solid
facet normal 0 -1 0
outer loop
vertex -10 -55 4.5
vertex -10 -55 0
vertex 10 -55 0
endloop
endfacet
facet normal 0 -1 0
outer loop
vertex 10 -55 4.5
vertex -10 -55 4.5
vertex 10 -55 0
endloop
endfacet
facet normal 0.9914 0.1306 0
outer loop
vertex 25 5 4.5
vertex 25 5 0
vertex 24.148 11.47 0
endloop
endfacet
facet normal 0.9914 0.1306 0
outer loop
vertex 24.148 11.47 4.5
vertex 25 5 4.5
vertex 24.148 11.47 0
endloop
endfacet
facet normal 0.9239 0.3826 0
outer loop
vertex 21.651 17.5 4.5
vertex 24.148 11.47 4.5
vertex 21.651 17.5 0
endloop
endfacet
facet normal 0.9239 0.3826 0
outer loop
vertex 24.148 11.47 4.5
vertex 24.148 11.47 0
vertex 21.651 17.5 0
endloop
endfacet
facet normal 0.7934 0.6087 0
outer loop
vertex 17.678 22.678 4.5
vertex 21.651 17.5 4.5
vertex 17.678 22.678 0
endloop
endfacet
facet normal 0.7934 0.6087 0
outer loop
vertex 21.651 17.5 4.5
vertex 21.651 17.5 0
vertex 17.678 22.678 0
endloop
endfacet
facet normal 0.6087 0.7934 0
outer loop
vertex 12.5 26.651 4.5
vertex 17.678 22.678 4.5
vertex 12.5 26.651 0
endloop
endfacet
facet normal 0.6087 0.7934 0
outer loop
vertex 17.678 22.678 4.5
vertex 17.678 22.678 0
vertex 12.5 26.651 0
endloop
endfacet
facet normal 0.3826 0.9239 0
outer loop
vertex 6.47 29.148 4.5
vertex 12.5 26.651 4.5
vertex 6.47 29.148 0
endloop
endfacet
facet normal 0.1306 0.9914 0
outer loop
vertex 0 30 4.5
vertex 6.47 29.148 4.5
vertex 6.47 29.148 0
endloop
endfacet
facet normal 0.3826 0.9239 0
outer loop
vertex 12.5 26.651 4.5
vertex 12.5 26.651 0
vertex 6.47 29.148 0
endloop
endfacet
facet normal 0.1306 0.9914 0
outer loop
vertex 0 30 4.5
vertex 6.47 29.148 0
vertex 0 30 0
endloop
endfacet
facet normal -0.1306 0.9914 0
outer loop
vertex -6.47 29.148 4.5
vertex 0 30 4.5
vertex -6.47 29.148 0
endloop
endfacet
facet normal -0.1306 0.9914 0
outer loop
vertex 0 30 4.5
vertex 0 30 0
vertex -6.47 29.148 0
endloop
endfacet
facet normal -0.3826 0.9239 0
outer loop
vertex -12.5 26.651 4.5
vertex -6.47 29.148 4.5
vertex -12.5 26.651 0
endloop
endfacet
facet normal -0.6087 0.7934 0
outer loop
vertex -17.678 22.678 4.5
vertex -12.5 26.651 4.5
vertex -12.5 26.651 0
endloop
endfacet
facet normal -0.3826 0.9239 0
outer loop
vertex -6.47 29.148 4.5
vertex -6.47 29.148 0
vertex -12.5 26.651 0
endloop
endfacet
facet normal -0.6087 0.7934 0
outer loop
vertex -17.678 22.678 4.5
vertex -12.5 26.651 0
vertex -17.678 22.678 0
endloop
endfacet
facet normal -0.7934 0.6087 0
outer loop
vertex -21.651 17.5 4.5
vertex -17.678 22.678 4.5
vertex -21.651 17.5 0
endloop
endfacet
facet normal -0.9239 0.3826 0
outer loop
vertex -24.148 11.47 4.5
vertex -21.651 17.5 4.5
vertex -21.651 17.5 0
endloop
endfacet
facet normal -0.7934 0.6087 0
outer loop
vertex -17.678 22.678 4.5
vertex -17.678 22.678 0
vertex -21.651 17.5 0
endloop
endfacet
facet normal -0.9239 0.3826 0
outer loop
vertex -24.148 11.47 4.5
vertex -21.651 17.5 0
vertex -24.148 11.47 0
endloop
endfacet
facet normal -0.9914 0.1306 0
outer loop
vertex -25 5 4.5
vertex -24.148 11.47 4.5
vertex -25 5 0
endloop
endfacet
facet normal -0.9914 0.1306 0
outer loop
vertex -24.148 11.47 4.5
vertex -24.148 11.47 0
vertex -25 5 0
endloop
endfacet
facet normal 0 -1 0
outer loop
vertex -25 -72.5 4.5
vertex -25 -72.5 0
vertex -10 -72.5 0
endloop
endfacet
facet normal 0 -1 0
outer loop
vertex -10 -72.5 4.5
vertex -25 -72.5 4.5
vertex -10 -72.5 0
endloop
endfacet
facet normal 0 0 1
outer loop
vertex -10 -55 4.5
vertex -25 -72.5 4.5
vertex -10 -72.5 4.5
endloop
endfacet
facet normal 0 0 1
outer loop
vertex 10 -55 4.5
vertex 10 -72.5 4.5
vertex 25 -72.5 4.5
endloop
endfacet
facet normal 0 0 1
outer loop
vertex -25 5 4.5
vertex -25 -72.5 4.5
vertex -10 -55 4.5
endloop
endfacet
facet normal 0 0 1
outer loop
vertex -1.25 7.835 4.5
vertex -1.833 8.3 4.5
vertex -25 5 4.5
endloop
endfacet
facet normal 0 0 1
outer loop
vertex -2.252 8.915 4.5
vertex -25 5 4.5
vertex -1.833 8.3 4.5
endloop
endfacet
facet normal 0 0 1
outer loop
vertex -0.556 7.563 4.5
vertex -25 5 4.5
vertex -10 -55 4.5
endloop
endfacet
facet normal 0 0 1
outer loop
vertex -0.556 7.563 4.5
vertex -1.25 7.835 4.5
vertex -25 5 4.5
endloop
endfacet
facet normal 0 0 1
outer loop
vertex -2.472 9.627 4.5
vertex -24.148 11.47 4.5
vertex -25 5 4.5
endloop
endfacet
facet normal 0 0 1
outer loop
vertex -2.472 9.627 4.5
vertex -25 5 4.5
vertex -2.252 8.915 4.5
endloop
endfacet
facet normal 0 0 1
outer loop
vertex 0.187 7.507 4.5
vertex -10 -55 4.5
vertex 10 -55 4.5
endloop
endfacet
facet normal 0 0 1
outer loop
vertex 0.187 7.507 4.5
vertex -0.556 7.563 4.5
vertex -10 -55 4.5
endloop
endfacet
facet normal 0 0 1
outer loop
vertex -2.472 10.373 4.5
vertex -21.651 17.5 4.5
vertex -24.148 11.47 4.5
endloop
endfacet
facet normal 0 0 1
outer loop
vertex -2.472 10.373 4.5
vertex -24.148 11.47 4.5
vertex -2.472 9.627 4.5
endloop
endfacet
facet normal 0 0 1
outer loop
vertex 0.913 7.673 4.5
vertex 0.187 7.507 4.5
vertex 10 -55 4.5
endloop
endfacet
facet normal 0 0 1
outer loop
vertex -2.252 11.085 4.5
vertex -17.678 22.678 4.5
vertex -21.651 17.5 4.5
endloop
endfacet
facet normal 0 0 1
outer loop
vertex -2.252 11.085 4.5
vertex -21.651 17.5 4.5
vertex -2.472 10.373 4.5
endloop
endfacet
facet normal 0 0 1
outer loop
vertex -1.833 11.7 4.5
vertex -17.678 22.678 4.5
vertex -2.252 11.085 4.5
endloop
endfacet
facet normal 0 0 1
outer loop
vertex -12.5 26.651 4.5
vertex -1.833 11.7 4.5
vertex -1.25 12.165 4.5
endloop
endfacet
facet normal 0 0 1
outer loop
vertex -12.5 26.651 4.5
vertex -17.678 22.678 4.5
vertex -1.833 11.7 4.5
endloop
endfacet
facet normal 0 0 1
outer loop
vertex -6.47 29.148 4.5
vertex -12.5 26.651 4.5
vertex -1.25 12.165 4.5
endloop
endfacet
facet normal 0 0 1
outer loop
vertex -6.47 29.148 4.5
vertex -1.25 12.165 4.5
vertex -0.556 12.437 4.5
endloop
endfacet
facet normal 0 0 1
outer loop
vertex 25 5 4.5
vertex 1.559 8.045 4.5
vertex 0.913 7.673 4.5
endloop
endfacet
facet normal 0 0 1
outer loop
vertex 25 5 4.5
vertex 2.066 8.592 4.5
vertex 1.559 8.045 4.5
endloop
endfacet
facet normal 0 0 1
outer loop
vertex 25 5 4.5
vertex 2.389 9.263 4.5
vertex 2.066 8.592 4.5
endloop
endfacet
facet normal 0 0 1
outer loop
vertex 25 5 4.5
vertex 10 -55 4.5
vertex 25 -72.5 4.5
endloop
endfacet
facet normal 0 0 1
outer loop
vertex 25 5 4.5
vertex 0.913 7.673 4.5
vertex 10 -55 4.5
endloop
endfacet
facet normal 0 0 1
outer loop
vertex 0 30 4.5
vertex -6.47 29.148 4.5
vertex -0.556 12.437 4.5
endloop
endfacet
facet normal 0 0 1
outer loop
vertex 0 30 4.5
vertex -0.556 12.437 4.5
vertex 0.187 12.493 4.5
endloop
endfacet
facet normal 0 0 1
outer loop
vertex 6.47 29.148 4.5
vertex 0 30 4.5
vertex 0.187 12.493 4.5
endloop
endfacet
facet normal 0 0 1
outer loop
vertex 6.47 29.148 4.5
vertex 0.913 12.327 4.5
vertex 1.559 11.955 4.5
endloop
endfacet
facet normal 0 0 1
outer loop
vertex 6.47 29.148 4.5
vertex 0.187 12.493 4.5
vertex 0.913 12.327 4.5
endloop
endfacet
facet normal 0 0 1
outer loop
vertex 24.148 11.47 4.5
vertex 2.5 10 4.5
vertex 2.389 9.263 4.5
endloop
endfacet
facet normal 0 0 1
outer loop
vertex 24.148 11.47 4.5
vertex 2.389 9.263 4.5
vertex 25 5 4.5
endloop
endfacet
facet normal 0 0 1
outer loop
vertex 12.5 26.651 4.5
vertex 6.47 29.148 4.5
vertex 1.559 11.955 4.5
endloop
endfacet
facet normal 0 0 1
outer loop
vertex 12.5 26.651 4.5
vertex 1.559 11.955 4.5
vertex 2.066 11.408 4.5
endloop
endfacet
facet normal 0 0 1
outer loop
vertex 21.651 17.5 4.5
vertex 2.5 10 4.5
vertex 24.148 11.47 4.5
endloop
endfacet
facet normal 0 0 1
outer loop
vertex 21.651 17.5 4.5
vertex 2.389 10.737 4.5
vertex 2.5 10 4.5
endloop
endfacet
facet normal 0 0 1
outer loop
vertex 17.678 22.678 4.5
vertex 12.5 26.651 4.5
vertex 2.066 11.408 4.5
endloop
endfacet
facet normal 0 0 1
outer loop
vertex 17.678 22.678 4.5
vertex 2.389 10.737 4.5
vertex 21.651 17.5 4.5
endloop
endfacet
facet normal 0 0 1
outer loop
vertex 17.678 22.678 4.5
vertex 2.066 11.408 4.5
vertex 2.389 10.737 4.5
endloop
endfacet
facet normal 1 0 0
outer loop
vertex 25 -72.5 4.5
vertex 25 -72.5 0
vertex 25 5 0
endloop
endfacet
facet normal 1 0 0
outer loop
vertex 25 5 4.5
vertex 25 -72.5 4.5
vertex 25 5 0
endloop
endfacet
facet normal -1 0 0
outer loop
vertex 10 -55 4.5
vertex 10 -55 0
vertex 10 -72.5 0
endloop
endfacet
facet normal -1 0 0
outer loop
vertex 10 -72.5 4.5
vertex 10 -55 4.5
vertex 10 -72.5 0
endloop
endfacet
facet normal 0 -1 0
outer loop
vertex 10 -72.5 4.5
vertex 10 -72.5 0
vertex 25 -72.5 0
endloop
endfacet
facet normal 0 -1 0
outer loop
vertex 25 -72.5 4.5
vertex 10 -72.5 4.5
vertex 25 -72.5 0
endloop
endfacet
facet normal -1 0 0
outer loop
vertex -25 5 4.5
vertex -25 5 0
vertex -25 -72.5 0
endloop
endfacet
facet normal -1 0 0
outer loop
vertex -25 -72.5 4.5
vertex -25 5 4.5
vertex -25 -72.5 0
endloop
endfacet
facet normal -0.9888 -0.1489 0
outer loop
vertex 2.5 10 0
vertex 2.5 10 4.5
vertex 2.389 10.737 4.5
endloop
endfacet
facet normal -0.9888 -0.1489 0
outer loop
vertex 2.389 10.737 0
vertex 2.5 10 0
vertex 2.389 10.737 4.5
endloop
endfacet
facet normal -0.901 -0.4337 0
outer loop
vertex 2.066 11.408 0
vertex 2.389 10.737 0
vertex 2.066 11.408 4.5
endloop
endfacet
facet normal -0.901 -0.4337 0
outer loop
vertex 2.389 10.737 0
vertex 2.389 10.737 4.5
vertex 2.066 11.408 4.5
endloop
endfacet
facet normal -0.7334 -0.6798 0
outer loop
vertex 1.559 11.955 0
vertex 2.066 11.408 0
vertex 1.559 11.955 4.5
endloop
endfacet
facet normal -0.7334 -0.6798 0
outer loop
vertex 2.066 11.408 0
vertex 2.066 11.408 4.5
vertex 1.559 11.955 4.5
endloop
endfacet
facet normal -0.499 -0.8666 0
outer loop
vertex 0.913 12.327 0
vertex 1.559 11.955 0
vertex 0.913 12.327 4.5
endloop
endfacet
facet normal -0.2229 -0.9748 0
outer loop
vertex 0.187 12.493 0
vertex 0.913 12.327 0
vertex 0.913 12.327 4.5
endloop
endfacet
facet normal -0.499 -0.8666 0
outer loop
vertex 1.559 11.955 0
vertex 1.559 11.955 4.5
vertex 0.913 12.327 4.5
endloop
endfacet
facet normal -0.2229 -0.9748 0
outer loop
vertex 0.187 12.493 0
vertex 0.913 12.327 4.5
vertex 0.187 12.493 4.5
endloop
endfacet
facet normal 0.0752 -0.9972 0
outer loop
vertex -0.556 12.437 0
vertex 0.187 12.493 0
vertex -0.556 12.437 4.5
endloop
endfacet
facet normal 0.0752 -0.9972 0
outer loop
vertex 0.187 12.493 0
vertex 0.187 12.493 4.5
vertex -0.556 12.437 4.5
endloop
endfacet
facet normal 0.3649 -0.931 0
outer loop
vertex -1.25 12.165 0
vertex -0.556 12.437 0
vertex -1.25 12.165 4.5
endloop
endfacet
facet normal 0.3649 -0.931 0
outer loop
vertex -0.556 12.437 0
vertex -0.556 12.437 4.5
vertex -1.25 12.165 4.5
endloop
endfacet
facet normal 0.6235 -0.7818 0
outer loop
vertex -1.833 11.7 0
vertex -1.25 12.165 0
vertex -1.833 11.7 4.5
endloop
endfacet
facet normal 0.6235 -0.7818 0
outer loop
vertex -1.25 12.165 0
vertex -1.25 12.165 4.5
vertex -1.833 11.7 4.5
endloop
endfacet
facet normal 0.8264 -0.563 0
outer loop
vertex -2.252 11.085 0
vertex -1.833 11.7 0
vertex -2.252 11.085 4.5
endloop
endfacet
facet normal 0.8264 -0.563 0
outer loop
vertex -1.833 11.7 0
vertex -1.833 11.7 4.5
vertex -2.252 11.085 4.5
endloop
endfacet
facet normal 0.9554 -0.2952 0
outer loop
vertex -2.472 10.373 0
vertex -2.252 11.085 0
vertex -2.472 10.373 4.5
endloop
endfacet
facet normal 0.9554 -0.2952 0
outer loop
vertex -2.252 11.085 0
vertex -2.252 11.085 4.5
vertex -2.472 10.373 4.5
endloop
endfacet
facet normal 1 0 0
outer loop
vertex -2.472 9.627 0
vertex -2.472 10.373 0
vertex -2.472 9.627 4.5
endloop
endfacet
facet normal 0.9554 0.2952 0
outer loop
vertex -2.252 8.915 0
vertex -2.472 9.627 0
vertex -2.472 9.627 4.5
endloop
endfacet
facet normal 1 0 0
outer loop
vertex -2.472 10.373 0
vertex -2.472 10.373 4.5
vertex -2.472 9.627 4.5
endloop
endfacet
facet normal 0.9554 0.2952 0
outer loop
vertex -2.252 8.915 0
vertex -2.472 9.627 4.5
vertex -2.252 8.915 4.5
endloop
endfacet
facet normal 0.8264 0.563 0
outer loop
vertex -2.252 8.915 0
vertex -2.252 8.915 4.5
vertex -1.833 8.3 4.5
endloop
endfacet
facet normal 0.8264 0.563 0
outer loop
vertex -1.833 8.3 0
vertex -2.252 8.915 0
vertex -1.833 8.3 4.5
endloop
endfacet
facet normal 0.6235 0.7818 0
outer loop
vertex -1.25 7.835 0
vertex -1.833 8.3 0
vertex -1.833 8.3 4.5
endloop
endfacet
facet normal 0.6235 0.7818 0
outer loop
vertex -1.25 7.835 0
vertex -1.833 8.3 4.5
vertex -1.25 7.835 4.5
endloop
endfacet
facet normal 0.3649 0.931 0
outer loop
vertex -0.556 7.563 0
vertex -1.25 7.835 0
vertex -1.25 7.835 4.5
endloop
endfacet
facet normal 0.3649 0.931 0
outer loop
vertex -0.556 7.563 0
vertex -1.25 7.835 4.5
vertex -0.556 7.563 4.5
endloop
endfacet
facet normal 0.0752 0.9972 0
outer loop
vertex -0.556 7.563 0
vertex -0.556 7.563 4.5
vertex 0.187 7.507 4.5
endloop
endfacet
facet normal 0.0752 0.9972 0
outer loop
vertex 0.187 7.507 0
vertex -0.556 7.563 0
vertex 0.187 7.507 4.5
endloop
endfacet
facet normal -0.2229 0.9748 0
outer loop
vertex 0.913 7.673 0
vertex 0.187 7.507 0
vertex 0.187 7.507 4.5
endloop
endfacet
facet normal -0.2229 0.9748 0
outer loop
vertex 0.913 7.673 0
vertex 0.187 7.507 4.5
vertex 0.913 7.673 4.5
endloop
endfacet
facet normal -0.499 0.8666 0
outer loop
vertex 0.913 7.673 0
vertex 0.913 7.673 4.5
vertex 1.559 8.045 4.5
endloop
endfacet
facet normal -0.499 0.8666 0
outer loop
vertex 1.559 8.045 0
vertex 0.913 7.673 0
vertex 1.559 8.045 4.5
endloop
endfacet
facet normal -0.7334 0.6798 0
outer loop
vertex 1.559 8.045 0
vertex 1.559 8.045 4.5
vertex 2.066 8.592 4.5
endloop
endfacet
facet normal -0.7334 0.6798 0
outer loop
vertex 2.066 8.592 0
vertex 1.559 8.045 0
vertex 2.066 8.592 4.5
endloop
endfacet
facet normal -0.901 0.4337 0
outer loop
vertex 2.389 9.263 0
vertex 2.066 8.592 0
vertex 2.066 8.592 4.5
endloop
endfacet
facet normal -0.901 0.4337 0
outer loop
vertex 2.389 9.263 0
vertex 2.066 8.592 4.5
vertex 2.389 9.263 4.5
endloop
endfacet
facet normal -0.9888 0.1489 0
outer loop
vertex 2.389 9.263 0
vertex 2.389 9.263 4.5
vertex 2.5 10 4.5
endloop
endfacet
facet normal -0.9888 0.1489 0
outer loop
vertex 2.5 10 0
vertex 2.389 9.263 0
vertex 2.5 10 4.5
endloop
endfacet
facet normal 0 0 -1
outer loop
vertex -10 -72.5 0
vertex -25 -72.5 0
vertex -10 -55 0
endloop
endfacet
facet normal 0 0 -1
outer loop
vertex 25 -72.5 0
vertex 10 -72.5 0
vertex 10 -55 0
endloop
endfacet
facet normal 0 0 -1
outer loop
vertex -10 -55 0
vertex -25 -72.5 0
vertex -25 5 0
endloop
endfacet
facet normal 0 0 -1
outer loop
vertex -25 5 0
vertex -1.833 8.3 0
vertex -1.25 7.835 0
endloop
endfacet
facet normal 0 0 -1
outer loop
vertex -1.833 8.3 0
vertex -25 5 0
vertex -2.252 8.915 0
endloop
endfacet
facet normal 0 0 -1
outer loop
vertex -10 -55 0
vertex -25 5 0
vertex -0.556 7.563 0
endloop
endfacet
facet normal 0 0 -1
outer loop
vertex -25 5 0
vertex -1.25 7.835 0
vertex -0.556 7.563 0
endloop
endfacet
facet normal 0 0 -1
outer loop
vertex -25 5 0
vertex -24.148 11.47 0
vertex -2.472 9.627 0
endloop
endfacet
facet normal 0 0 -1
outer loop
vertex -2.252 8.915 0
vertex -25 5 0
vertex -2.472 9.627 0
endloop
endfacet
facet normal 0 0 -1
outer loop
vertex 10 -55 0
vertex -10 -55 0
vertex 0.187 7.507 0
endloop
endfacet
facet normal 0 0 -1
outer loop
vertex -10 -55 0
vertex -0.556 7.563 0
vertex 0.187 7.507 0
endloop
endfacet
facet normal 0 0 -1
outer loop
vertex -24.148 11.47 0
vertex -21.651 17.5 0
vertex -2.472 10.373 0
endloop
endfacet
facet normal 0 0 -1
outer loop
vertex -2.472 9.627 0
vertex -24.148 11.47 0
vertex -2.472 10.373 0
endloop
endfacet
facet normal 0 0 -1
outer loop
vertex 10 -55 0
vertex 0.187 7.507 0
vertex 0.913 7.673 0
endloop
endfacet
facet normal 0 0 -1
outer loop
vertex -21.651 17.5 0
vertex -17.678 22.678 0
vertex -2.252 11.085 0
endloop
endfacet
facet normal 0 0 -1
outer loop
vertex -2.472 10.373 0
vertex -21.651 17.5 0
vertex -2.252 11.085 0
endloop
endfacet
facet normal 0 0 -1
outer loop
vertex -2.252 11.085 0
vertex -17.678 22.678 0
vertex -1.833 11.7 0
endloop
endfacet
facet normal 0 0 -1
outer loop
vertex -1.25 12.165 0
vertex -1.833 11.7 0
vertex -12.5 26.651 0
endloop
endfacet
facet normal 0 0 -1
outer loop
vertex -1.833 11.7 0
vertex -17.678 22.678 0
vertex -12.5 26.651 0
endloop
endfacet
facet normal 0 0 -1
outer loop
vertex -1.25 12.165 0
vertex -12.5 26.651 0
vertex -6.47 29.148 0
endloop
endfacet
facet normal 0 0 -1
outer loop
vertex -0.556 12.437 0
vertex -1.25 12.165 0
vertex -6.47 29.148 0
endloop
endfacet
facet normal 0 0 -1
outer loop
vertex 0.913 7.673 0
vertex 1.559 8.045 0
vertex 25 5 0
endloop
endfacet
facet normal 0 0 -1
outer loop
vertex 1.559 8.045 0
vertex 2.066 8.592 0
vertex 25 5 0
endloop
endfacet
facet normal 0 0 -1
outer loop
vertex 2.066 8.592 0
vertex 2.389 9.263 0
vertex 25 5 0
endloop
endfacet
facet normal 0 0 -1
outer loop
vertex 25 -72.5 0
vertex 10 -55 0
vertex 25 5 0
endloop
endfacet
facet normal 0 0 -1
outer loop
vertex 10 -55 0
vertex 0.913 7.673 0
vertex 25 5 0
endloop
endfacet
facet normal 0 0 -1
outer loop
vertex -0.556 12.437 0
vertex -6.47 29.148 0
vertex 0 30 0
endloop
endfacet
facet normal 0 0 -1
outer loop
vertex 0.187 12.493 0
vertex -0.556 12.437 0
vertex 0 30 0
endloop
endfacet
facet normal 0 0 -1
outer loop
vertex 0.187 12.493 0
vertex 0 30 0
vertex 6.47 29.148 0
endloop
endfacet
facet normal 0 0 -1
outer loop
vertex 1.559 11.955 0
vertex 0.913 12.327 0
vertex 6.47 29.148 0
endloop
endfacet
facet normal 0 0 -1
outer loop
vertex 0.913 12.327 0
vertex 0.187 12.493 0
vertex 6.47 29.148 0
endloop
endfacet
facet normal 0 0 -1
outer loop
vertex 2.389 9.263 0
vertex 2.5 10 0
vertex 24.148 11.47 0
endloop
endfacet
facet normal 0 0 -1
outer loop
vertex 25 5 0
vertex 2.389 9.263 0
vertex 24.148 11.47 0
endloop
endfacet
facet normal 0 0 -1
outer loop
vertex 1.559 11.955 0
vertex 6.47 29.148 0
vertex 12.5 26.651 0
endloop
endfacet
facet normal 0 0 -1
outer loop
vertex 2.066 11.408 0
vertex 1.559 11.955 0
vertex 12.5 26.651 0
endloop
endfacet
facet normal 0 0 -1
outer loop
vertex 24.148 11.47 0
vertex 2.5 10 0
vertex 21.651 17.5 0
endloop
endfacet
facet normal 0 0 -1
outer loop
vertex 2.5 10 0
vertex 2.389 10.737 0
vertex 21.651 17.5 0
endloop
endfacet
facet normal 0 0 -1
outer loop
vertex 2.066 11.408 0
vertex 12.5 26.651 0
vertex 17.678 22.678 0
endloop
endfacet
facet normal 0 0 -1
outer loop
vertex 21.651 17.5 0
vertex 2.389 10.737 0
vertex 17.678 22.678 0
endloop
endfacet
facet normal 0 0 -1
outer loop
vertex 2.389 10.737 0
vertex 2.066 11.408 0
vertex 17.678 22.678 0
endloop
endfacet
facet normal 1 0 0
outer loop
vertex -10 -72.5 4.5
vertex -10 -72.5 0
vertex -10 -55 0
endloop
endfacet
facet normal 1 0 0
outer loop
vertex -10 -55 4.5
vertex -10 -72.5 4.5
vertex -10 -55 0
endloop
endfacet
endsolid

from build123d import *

# Parameters (mm, degrees)
SKETCH1_W           = 15
SKETCH1_H           = 10
SKETCH1_H_2         = 7.5
BOSS_EXTRUDE1_DEPTH = 4.5
SKETCH2_R           = 2.5
CUT_EXTRUDE1_DEPTH  = 10


with BuildPart() as part:
    # Sketch1 → Boss-Extrude1 (new body)
    with BuildSketch(Plane.XY):
        Polygon((-25, -55), (-10, -55), (10, -55), (25, -55), (25, 5), (-25, 5), align=None)
        with Locations((17.5, -60)):
            Rectangle(SKETCH1_W, SKETCH1_H)
        with Locations((-17.5, -60)):
            Rectangle(SKETCH1_W, SKETCH1_H)
        with BuildLine():
            Line((-25, 5), (25, 5))
            ThreePointArc((25, 5), (0, 30), (-25, 5))
        make_face()
        with Locations((-17.5, -68.75)):
            Rectangle(SKETCH1_W, SKETCH1_H_2)
        with Locations((17.5, -68.75)):
            Rectangle(SKETCH1_W, SKETCH1_H_2)
    extrude(amount=BOSS_EXTRUDE1_DEPTH)

    # Sketch2 → Cut-Extrude1 (cut)
    with BuildSketch(Plane.XY.offset(4.5)):
        with Locations((0, 10)):
            Circle(SKETCH2_R)
    extrude(amount=-CUT_EXTRUDE1_DEPTH, mode=Mode.SUBTRACT)


solid = part.part
